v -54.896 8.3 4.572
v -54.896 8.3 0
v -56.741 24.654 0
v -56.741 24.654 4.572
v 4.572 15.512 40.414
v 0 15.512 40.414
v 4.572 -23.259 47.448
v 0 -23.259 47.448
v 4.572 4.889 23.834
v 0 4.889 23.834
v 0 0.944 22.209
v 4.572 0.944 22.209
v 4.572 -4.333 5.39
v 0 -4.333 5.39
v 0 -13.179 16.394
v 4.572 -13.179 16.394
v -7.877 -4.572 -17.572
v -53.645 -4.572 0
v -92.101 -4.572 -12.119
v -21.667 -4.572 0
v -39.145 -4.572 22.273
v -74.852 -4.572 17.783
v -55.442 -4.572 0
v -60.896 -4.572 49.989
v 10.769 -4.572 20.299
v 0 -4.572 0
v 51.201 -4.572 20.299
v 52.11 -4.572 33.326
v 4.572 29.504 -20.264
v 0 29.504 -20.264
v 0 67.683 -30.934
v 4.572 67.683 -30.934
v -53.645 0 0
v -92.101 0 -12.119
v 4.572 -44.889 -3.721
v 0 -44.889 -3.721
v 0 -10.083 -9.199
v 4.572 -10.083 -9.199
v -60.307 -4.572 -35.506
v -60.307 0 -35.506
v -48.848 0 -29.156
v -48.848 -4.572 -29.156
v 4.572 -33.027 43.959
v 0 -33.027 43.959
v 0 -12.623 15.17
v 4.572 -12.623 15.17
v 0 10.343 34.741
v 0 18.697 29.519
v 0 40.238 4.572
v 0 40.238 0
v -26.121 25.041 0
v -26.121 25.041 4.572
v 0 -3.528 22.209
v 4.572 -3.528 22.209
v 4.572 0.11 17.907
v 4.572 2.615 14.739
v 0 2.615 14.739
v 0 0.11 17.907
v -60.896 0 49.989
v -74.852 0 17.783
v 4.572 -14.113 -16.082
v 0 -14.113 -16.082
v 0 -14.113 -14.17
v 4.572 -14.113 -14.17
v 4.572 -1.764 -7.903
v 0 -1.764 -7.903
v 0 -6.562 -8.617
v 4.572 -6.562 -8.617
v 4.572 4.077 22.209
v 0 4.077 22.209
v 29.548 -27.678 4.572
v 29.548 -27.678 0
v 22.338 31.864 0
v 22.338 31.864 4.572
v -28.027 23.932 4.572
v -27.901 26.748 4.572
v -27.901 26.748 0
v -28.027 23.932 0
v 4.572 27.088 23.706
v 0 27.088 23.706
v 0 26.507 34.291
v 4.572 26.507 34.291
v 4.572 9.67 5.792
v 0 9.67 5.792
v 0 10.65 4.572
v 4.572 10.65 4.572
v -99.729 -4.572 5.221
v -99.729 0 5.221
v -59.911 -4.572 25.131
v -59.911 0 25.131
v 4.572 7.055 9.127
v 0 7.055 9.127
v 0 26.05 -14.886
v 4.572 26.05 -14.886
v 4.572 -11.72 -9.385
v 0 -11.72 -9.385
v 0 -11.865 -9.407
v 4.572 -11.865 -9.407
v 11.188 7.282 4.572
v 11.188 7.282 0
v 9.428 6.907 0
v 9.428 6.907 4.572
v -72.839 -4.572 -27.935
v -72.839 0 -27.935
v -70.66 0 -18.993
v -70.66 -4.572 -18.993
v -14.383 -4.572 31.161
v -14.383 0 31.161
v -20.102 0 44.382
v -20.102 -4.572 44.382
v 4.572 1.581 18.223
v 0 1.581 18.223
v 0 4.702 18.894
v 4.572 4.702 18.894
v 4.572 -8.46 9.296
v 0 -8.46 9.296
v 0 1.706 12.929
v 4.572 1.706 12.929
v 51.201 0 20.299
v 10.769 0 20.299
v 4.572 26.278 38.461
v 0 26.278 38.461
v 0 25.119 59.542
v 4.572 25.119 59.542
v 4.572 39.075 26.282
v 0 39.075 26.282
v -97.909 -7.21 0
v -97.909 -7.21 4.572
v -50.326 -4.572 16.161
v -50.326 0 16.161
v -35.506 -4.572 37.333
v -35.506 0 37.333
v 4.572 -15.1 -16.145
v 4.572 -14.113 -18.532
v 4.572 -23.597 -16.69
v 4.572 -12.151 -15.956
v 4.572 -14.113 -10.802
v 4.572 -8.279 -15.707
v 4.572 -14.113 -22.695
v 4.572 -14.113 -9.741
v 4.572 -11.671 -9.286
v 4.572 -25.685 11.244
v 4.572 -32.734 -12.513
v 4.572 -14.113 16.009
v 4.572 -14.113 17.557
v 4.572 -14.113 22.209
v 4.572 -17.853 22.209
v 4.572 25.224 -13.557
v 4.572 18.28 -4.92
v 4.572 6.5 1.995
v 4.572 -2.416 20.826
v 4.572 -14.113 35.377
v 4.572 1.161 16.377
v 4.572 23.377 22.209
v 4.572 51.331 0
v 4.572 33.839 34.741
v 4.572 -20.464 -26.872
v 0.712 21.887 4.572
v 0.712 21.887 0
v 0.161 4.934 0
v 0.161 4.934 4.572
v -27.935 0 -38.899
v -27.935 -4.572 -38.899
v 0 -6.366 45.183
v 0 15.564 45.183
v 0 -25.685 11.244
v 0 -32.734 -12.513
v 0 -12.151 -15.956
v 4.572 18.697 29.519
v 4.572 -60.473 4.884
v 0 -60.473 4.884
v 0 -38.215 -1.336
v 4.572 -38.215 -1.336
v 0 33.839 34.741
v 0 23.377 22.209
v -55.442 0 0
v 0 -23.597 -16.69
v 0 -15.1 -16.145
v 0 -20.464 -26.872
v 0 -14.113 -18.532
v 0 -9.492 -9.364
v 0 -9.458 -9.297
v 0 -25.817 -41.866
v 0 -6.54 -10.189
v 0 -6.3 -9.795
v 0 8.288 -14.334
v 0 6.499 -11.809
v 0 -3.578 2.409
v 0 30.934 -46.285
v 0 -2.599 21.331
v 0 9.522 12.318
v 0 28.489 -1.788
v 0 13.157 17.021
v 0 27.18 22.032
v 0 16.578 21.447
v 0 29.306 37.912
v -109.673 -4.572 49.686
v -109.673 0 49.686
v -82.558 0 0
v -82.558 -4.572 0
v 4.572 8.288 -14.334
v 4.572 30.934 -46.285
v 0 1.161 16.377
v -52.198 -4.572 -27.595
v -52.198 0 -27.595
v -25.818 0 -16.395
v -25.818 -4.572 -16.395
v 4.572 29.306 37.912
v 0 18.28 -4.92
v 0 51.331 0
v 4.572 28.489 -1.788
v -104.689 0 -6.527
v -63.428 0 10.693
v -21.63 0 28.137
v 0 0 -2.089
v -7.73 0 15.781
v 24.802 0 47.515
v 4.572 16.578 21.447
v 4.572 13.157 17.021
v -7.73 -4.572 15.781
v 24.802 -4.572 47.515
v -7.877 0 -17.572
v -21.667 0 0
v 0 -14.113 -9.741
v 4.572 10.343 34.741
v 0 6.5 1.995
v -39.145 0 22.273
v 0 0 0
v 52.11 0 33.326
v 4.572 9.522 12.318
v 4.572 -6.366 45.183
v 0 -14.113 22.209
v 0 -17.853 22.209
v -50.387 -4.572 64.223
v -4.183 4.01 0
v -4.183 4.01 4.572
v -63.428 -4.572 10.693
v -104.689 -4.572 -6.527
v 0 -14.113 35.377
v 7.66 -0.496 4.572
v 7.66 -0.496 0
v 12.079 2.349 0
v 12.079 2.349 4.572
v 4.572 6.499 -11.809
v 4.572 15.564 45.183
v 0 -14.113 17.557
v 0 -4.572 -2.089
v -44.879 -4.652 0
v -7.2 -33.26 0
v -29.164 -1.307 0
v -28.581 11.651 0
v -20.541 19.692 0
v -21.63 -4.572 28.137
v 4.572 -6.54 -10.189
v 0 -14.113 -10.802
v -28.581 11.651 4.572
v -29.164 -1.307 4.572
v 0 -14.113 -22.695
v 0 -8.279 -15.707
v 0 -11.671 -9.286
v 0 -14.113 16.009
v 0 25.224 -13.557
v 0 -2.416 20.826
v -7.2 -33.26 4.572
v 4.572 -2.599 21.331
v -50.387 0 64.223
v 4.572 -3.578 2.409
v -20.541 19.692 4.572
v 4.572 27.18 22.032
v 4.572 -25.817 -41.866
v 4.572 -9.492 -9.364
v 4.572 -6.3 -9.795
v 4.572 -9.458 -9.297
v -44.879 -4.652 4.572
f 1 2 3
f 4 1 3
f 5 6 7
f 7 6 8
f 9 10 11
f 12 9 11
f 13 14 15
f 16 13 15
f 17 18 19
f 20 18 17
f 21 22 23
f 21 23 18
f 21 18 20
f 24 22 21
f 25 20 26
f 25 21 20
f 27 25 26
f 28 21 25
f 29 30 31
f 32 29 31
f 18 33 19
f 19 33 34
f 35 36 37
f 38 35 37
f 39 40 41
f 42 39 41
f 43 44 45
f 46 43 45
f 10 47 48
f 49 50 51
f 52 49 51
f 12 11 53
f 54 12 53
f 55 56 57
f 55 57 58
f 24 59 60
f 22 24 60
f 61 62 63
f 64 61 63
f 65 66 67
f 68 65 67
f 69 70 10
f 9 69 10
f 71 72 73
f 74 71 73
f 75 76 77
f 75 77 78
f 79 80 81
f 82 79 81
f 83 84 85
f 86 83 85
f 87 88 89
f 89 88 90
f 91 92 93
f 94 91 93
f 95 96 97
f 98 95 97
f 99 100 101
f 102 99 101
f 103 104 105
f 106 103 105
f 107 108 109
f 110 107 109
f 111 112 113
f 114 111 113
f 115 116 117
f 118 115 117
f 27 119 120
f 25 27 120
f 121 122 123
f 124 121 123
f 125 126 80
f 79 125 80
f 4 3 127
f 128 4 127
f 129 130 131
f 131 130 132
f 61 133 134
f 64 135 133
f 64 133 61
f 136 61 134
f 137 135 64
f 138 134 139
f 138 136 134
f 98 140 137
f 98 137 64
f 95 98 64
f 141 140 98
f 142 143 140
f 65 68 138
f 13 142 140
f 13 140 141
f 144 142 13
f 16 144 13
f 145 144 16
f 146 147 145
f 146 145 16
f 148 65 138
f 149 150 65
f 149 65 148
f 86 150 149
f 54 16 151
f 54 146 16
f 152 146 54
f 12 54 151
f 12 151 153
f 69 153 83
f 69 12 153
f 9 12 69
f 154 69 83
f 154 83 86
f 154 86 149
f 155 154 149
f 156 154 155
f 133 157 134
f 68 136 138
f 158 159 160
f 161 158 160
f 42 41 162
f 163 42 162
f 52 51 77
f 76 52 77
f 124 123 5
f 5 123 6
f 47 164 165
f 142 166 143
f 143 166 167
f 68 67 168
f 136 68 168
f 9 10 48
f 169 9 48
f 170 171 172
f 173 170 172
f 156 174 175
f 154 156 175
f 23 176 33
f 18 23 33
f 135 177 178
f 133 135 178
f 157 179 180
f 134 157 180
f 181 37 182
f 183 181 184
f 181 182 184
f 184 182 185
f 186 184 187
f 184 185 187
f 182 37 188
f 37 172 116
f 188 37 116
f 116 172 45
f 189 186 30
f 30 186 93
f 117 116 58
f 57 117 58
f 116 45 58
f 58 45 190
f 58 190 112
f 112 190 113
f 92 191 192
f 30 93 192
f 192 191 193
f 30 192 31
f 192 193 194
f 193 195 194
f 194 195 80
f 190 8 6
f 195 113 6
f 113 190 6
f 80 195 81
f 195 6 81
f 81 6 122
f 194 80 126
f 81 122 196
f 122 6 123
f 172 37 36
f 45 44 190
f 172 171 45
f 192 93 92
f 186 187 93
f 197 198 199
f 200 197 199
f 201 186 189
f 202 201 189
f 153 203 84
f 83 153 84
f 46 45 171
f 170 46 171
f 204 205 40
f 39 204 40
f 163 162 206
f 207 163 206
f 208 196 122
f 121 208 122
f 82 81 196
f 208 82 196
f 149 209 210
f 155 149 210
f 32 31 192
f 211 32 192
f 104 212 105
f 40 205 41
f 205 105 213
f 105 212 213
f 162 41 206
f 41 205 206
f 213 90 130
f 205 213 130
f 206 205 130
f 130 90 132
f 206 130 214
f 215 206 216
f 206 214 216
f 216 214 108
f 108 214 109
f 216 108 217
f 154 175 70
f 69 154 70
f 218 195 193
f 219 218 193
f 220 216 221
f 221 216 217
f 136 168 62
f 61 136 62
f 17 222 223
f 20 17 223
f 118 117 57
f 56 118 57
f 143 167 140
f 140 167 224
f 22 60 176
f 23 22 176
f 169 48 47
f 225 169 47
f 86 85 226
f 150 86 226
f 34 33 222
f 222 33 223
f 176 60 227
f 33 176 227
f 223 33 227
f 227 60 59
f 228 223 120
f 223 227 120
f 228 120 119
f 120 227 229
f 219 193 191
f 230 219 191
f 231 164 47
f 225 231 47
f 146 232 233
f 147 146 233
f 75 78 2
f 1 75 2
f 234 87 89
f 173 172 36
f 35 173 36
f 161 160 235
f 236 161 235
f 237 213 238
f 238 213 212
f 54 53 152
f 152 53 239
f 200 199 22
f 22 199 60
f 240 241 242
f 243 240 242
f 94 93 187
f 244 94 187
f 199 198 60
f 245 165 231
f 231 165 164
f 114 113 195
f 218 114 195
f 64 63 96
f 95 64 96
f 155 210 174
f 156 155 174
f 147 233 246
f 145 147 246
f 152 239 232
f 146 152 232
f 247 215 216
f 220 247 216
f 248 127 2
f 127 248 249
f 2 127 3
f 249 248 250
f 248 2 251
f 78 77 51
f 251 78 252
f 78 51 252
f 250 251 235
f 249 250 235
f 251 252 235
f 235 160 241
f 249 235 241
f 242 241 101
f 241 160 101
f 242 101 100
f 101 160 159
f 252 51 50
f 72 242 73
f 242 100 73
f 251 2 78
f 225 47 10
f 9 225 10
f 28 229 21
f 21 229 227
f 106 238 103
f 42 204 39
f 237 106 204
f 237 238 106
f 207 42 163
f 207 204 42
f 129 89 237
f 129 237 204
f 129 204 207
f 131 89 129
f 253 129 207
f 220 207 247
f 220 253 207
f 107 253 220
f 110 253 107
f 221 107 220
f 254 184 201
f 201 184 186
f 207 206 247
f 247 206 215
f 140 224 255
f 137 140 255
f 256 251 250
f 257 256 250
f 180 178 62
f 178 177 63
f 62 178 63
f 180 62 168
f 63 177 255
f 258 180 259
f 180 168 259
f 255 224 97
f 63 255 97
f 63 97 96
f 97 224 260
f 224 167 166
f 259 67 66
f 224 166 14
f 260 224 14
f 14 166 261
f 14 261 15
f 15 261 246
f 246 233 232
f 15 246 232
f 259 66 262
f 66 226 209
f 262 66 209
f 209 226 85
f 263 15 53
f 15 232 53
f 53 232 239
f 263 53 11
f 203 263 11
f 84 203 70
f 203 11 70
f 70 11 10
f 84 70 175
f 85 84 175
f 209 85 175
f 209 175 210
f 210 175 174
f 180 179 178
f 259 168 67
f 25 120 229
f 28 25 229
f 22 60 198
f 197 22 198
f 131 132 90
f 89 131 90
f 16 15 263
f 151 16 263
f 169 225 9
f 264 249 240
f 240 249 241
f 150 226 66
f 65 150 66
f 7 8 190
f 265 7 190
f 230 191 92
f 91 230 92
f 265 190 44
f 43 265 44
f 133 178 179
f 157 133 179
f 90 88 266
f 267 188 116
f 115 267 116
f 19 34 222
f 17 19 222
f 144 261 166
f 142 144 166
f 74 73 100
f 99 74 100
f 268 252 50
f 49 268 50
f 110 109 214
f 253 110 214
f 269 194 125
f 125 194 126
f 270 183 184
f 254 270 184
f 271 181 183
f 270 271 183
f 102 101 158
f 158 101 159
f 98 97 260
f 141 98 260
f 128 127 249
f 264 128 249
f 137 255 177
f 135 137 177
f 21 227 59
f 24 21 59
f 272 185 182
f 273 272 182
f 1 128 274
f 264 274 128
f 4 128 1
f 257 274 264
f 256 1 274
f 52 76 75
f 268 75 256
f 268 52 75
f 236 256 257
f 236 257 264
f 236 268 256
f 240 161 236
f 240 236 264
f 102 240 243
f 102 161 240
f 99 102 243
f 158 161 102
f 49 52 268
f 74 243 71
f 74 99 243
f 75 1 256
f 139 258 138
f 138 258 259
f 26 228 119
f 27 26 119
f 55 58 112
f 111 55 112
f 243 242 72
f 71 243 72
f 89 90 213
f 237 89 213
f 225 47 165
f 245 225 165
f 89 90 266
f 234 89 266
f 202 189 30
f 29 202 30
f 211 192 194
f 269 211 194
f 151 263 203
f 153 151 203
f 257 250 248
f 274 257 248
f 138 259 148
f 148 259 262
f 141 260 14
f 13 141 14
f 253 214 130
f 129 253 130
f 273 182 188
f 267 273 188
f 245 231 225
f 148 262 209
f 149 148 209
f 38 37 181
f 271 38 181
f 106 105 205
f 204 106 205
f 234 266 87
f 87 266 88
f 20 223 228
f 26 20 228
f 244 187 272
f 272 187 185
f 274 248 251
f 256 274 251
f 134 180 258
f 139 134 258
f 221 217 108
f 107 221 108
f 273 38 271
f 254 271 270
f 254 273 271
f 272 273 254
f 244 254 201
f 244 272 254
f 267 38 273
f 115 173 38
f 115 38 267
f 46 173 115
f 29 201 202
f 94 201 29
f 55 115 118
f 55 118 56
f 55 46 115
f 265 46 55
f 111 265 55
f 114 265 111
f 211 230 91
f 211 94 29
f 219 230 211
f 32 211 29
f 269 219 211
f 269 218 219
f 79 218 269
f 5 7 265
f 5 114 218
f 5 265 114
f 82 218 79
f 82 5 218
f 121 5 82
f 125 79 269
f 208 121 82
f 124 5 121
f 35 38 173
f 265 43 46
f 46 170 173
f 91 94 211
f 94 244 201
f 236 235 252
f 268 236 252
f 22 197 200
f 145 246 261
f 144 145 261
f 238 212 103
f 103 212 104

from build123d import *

# Parameters (mm, degrees)
F3_DEPTH = 4.572
F4_DEPTH = 4.572
F5_DEPTH = 4.572
F7_DEPTH = 4.572
F9_DEPTH = 4.572


with BuildPart() as f3:
    # F0 (on Front) → F3 (new body)
    with BuildSketch(Plane.XZ):
        Polygon((-82.5575739145, 0), (-74.8516700621, 17.7828554518), (-109.6728146076, 49.6860258281), align=None)
    extrude(amount=F3_DEPTH)


with BuildPart() as f3b:
    # F0 (on Front) → F3, piece 2 (new body)
    with BuildSketch(Plane.XZ):
        Polygon((-21.6666485413, 0), (0, 0), (51.2008480728, 20.2985610813), (10.7693464256, 20.2985610813), (-28.0068135198, 8.0791818403), align=None)
        Polygon((-7.8770499676, -17.571888864), (-21.6666485413, 0), (-53.6447482374, 0), (-92.1009257436, -12.1185444295), align=None)
        Polygon((-53.6447482374, 0), (-21.6666485413, 0), (-28.0068135198, 8.0791818403), align=None)
        Polygon((-55.4423332214, 0), (-53.6447482374, 0), (-28.0068135198, 8.0791818403), (-37.5960122597, 20.2985610813), (-55.4423332214, 20.2985610813), (-39.1451364363, 22.2725879337), (-60.8956776559, 49.9889925122), (-74.8516700621, 17.7828554518), align=None)
        Polygon((-37.5960122597, 20.2985610813), (-28.0068135198, 8.0791818403), (10.7693464256, 20.2985610813), align=None)
        Polygon((-37.5960122597, 20.2985610813), (10.7693464256, 20.2985610813), (52.1097369492, 33.3259962499), (-39.1451364363, 22.2725879337), align=None)
        Polygon((-55.4423332214, 20.2985610813), (-37.5960122597, 20.2985610813), (-39.1451364363, 22.2725879337), align=None)
    extrude(amount=F3_DEPTH)


with BuildPart() as f4:
    # F1 (on Top) → F4 (new body)
    with BuildSketch(Plane.XY):
        Polygon((-30.2264653146, -24.8868316412), (-29.1643092862, -1.3069657687), (-44.8794588447, -4.6517443843), (-28.5806321541, 11.6506676864), (-28.0274361012, 23.9316211227), (-54.8957499852, 8.300016208), (-56.7414090037, 24.6542450041), (-97.9093462229, -7.2102034464), (-7.2003318928, -33.2599692047), (7.6604056604, -0.4961419795), align=None)
        Polygon((-83.9541107416, -8.6057269946), (-54.8957499852, 8.300016208), (-52.8296263813, -10.0077306732), align=None, mode=Mode.SUBTRACT)
        Polygon((0.1605810986, 4.9344807985), (0, 0), (-4.1828936972, 4.0100249694), (-29.1643092862, -1.3069657687), (-30.2264653146, -24.8868316412), (7.6604056604, -0.4961419795), (10.3213577254, 5.370523346), (9.427549079, 6.9068423225), align=None)
        Polygon((22.3382469267, 31.8644493818), (11.1881518136, 7.28156522), (23.9663552493, 10.0012505427), (12.0794068127, 2.3487085702), (29.5484494418, -27.6778768748), align=None)
        Polygon((-29.1643092862, -1.3069657687), (-4.1828936972, 4.0100249694), (-20.5409885059, 19.6920798778), (-28.5806321541, 11.6506676864), align=None)
        Polygon((-52.8296263813, -10.0077306732), (-54.8957499852, 8.300016208), (-83.9541107416, -8.6057269946), align=None)
        Polygon((-26.1205296729, 25.0410323059), (-20.5409885059, 19.6920798778), (0, 40.2375869453), align=None)
        Polygon((0.7122633979, 21.887071963), (0.1605810986, 4.9344807985), (9.427549079, 6.9068423225), align=None)
        Polygon((-28.5806321541, 11.6506676864), (-20.5409885059, 19.6920798778), (-26.1205296729, 25.0410323059), (-28.0274361012, 23.9316211227), align=None)
        Polygon((23.9663552493, 10.0012505427), (11.1881518136, 7.28156522), (10.3213577254, 5.370523346), (12.0794068127, 2.3487085702), align=None)
        Polygon((-4.1828936972, 4.0100249694), (0, 0), (0.1605810986, 4.9344807985), align=None)
        Polygon((12.0794068127, 2.3487085702), (10.3213577254, 5.370523346), (7.6604056604, -0.4961419795), align=None)
        Polygon((-28.0274361012, 23.9316211227), (-26.1205296729, 25.0410323059), (-27.9005933553, 26.7475303262), align=None)
        Polygon((11.1881518136, 7.28156522), (9.427549079, 6.9068423225), (10.3213577254, 5.370523346), align=None)
    extrude(amount=F4_DEPTH)


with BuildPart() as f5:
    # F2 (on Right) → F5 (new body)
    with BuildSketch(Plane.YZ):
        Polygon((-11.6709794468, -9.2863757221), (-4.3327892504, 5.3900042912), (-13.1785160436, 16.3941179508), (-14.112967217, 16.0093439428), (-14.112967217, -9.7413167059), (-11.8647352483, -9.4066657912), align=None)
        Polygon((-14.112967217, 16.0093439428), (-13.1785160436, 16.3941179508), (-14.112967217, 17.55657833), align=None)
        Polygon((-14.112967217, 17.55657833), (-13.1785160436, 16.3941179508), (-2.4156556784, 20.8258839304), (-3.5277008119, 22.2092717886), (-14.112967217, 22.2092717886), align=None)
        Polygon((4.0768447157, 22.2092717886), (1.1606701048, 16.3769227176), (9.6697870104, 5.7915528817), (23.3766396491, 22.2092717886), align=None)
        Polygon((-2.4156556784, 20.8258839304), (1.1606701048, 16.3769227176), (4.0768447157, 22.2092717886), (0.944000589, 22.2092717886), align=None)
        Polygon((10.6504993847, 4.5715434143), (6.4998476512, 1.9946802718), (-1.7636361041, -7.903110057), (18.2800142598, -4.9195985592), align=None)
        Polygon((-1.7636361041, -7.903110057), (-6.5624073064, -8.6174105361), (-12.1507356053, -15.9557113932), (-8.2791860566, -15.7072698058), align=None)
        Polygon((-17.8530644625, 22.2092717886), (-14.112967217, 17.55657833), (-14.112967217, 22.2092717886), align=None)
        Polygon((-14.112967217, -9.7413167059), (-14.112967217, 16.0093439428), (-25.6851743907, 11.2443175167), (-32.7340736985, -12.5130815431), align=None)
        Polygon((-3.5277008119, 22.2092717886), (-2.4156556784, 20.8258839304), (0.944000589, 22.2092717886), align=None)
        Polygon((23.3766396491, 22.2092717886), (9.6697870104, 5.7915528817), (10.6504993847, 4.5715434143), (39.0602611005, 22.2092717886), align=None)
        Polygon((0.944000589, 22.2092717886), (4.0768447157, 22.2092717886), (4.8890635775, 23.8337094703), align=None)
        Polygon((-11.720380856, -9.385178538), (-11.8647352483, -9.4066657912), (-14.112967217, -10.802443242), (-14.112967217, -14.1703511364), align=None)
        Polygon((-14.112967217, -10.802443242), (-11.8647352483, -9.4066657912), (-14.112967217, -9.7413167059), align=None)
        Polygon((39.0602611005, 22.2092717886), (10.6504993847, 4.5715434143), (18.2800142598, -4.9195985592), (51.3305701315, 0), (33.8388569653, 34.7406491637), (23.3766396491, 22.2092717886), align=None)
        Polygon((18.2800142598, -4.9195985592), (-1.7636361041, -7.903110057), (-8.2791860566, -15.7072698058), (25.2235364169, -13.5573633015), align=None)
        Polygon((-14.112967217, -18.5324114632), (-12.1507356053, -15.9557113932), (-14.112967217, -16.0816299513), align=None)
        Polygon((-8.2791860566, -15.7072698058), (-12.1507356053, -15.9557113932), (-14.112967217, -18.5324114632), (-14.112967217, -22.6948242635), align=None)
        Polygon((-14.112967217, 35.3773785324), (-14.112967217, 22.2092717886), (-3.5277008119, 22.2092717886), align=None)
        Polygon((-14.112967217, -14.1703511364), (-14.112967217, -10.802443242), (-23.5966108739, -16.6902057827), (-15.1002852928, -16.1449872368), align=None)
        Polygon((-14.112967217, -16.0816299513), (-14.112967217, -14.1703511364), (-15.1002852928, -16.1449872368), align=None)
        Polygon((-14.112967217, -18.5324114632), (-14.112967217, -16.0816299513), (-15.1002852928, -16.1449872368), (-20.4637665302, -26.8719494343), align=None)
    extrude(amount=F5_DEPTH)


with BuildPart() as f5b:
    # F2 (on Right) → F5, piece 2 (new body)
    with BuildSketch(Plane.YZ):
        Polygon((-6.3659697771, 45.1834574342), (10.3425312173, 34.7406444679), (15.5639378354, 45.1834574342), align=None)
    extrude(amount=F5_DEPTH)


with BuildPart() as f5c:
    # F2 (on Right) → F5, piece 3 (new body)
    with BuildSketch(Plane.YZ):
        Polygon((10.3425312173, 34.7406444679), (4.8890635775, 23.8337094703), (18.6967793852, 29.5192394406), align=None)
    extrude(amount=F5_DEPTH)


with BuildPart() as f7:
    # F6 (on Front) → F7 (new body)
    with BuildSketch(Plane.XZ):
        Polygon((-99.728859961, 5.2214069292), (-59.9105844404, 25.1305452669), (-50.386570394, 64.2232969403), align=None)
    extrude(amount=F7_DEPTH)


with BuildPart() as f7b:
    # F6 (on Front) → F7, piece 2 (new body)
    with BuildSketch(Plane.XZ):
        Polygon((-50.3258952086, 16.1611531024), (-35.5055630207, 37.3330563307), (-59.9105844404, 25.1305452669), (-63.4279038249, 10.6931775161), align=None)
        Polygon((-21.6301538046, 28.1369972667), (-50.3258952086, 16.1611531024), (-68.3788705082, -9.6288117365), (-70.6602708853, -18.9931635715), (-52.1977105079, -27.5950381993), (-24.3134150211, -0.3950190076), align=None)
        Polygon((-68.3788705082, -9.6288117365), (-50.3258952086, 16.1611531024), (-63.4279038249, 10.6931775161), align=None)
        Polygon((-70.6602708853, -18.9931635715), (-68.3788705082, -9.6288117365), (-73.8829001784, -17.4917113036), align=None)
        Polygon((-73.8829001784, -17.4917113036), (-68.3788705082, -9.6288117365), (-63.4279038249, 10.6931775161), (-104.6891957521, -6.5267574973), (-72.8386193514, -27.9345232993), (-70.6602708853, -18.9931635715), align=None)
        Polygon((-14.3833906449, 31.1613521727), (-21.6301538046, 28.1369972667), (-24.3134150211, -0.3950190076), (-7.7301989516, 15.7812475065), align=None)
        Polygon((-20.1024152339, 44.3819537759), (-21.6301538046, 28.1369972667), (-14.3833906449, 31.1613521727), align=None)
        Polygon((-7.7301989516, 15.7812475065), (-24.3134150211, -0.3950190076), (-25.818085807, -16.3946880244), (0, -2.0885621198), align=None)
        Polygon((-25.818085807, -16.3946880244), (-24.3134150211, -0.3950190076), (-52.1977105079, -27.5950381993), (-48.8478487995, -29.1557692055), align=None)
        Polygon((24.8016808182, 47.5147999823), (-14.3833906449, 31.1613521727), (-7.7301989516, 15.7812475065), align=None)
        Polygon((-48.8478487995, -29.1557692055), (-52.1977105079, -27.5950381993), (-60.3072419763, -35.5055630207), align=None)
        Polygon((-27.9345232993, -38.8994775712), (-25.818085807, -16.3946880244), (-48.8478487995, -29.1557692055), align=None)
    extrude(amount=F7_DEPTH)


with BuildPart() as f9:
    # F8 (on Right) → F9 (new body)
    with BuildSketch(Plane.YZ):
        Polygon((9.5215268071, 12.3175298318), (7.054986864, 9.1266887045), (26.0497685522, -14.8855810985), (6.4986714811, -11.8086873813), (8.2883964257, -14.3338265797), (29.5043549522, -20.2635137998), (28.4892037347, -1.7877637871), align=None)
        Polygon((13.1573853495, 17.0210607851), (9.5215268071, 12.3175298318), (28.4892037347, -1.7877637871), (27.1804219123, 22.0320626132), align=None)
        Polygon((16.5784495208, 21.4467228498), (13.1573853495, 17.0210607851), (27.1804219123, 22.0320626132), (27.0884537669, 23.7058826658), align=None)
        Polygon((67.682877183, -30.934099108), (28.4892037347, -1.7877637871), (29.5043549522, -20.2635137998), align=None)
        Polygon((1.7058211505, 12.9289507148), (2.6151525232, 14.7393091506), (0.1096106938, 17.906692035), (-12.6227065571, 15.1698387641), (-8.4598024861, 9.2963595568), align=None)
        Polygon((8.2883964257, -14.3338265797), (6.4986714811, -11.8086873813), (-6.2995872124, -9.7945353558), (-6.5399120622, -10.1894354024), align=None)
        Polygon((4.7019407708, 18.8938284175), (16.5784495208, 21.4467228498), (26.5068738488, 34.2906359448), (26.2777281101, 38.4610879048), (15.5115105085, 40.4142513898), align=None)
        Polygon((26.5068738488, 34.2906359448), (16.5784495208, 21.4467228498), (27.0884537669, 23.7058826658), align=None)
        Polygon((27.0884537669, 23.7058826658), (27.1804219123, 22.0320626132), (39.074651897, 26.2823551893), align=None)
        Polygon((30.934099108, -46.2848544121), (29.5043549522, -20.2635137998), (8.2883964257, -14.3338265797), align=None)
        Polygon((-12.6227065571, 15.1698387641), (0.1096106938, 17.906692035), (-2.5993124675, 21.331179607), (-33.0273844302, 43.9589843154), align=None)
        Polygon((-2.5993124675, 21.331179607), (0.1096106938, 17.906692035), (1.5805018972, 18.222864914), align=None)
        Polygon((-3.5782886569, 2.4089873075), (-8.4598024861, 9.2963595568), (-38.2151932543, -1.3364528778), (-10.0834764605, -9.1990380795), (-9.4583415658, -9.2974199567), align=None)
        Polygon((-38.2151932543, -1.3364528778), (-8.4598024861, 9.2963595568), (-12.6227065571, 15.1698387641), (-60.4726746678, 4.8843314871), align=None)
        Polygon((-6.5399120622, -10.1894354024), (-6.2995872124, -9.7945353558), (-9.4583415658, -9.2974199567), (-9.4919654137, -9.3643605885), align=None)
        Polygon((26.2777281101, 38.4610879048), (26.5068738488, 34.2906359448), (29.3059889227, 37.9117131233), align=None)
        Polygon((1.5805018972, 18.222864914), (4.7019407708, 18.8938284175), (15.5115105085, 40.4142513898), (-23.2587214559, 47.4477894604), (-2.5993124675, 21.331179607), align=None)
        Polygon((-10.0834764605, -9.1990380795), (-38.2151932543, -1.3364528778), (-44.8893345892, -3.7213952746), align=None)
        Polygon((-9.4919654137, -9.3643605885), (-9.4583415658, -9.2974199567), (-10.0834764605, -9.1990380795), align=None)
        Polygon((-25.8171781898, -41.8656989932), (-6.5399120622, -10.1894354024), (-9.4919654137, -9.3643605885), align=None)
        Polygon((15.5115105085, 40.4142513898), (26.2777281101, 38.4610879048), (25.1194182783, 59.542324394), align=None)
    extrude(amount=F9_DEPTH)


solid = Compound([f3.part, f3b.part, f4.part, f5.part, f5b.part, f5c.part, f7.part, f7b.part, f9.part])
